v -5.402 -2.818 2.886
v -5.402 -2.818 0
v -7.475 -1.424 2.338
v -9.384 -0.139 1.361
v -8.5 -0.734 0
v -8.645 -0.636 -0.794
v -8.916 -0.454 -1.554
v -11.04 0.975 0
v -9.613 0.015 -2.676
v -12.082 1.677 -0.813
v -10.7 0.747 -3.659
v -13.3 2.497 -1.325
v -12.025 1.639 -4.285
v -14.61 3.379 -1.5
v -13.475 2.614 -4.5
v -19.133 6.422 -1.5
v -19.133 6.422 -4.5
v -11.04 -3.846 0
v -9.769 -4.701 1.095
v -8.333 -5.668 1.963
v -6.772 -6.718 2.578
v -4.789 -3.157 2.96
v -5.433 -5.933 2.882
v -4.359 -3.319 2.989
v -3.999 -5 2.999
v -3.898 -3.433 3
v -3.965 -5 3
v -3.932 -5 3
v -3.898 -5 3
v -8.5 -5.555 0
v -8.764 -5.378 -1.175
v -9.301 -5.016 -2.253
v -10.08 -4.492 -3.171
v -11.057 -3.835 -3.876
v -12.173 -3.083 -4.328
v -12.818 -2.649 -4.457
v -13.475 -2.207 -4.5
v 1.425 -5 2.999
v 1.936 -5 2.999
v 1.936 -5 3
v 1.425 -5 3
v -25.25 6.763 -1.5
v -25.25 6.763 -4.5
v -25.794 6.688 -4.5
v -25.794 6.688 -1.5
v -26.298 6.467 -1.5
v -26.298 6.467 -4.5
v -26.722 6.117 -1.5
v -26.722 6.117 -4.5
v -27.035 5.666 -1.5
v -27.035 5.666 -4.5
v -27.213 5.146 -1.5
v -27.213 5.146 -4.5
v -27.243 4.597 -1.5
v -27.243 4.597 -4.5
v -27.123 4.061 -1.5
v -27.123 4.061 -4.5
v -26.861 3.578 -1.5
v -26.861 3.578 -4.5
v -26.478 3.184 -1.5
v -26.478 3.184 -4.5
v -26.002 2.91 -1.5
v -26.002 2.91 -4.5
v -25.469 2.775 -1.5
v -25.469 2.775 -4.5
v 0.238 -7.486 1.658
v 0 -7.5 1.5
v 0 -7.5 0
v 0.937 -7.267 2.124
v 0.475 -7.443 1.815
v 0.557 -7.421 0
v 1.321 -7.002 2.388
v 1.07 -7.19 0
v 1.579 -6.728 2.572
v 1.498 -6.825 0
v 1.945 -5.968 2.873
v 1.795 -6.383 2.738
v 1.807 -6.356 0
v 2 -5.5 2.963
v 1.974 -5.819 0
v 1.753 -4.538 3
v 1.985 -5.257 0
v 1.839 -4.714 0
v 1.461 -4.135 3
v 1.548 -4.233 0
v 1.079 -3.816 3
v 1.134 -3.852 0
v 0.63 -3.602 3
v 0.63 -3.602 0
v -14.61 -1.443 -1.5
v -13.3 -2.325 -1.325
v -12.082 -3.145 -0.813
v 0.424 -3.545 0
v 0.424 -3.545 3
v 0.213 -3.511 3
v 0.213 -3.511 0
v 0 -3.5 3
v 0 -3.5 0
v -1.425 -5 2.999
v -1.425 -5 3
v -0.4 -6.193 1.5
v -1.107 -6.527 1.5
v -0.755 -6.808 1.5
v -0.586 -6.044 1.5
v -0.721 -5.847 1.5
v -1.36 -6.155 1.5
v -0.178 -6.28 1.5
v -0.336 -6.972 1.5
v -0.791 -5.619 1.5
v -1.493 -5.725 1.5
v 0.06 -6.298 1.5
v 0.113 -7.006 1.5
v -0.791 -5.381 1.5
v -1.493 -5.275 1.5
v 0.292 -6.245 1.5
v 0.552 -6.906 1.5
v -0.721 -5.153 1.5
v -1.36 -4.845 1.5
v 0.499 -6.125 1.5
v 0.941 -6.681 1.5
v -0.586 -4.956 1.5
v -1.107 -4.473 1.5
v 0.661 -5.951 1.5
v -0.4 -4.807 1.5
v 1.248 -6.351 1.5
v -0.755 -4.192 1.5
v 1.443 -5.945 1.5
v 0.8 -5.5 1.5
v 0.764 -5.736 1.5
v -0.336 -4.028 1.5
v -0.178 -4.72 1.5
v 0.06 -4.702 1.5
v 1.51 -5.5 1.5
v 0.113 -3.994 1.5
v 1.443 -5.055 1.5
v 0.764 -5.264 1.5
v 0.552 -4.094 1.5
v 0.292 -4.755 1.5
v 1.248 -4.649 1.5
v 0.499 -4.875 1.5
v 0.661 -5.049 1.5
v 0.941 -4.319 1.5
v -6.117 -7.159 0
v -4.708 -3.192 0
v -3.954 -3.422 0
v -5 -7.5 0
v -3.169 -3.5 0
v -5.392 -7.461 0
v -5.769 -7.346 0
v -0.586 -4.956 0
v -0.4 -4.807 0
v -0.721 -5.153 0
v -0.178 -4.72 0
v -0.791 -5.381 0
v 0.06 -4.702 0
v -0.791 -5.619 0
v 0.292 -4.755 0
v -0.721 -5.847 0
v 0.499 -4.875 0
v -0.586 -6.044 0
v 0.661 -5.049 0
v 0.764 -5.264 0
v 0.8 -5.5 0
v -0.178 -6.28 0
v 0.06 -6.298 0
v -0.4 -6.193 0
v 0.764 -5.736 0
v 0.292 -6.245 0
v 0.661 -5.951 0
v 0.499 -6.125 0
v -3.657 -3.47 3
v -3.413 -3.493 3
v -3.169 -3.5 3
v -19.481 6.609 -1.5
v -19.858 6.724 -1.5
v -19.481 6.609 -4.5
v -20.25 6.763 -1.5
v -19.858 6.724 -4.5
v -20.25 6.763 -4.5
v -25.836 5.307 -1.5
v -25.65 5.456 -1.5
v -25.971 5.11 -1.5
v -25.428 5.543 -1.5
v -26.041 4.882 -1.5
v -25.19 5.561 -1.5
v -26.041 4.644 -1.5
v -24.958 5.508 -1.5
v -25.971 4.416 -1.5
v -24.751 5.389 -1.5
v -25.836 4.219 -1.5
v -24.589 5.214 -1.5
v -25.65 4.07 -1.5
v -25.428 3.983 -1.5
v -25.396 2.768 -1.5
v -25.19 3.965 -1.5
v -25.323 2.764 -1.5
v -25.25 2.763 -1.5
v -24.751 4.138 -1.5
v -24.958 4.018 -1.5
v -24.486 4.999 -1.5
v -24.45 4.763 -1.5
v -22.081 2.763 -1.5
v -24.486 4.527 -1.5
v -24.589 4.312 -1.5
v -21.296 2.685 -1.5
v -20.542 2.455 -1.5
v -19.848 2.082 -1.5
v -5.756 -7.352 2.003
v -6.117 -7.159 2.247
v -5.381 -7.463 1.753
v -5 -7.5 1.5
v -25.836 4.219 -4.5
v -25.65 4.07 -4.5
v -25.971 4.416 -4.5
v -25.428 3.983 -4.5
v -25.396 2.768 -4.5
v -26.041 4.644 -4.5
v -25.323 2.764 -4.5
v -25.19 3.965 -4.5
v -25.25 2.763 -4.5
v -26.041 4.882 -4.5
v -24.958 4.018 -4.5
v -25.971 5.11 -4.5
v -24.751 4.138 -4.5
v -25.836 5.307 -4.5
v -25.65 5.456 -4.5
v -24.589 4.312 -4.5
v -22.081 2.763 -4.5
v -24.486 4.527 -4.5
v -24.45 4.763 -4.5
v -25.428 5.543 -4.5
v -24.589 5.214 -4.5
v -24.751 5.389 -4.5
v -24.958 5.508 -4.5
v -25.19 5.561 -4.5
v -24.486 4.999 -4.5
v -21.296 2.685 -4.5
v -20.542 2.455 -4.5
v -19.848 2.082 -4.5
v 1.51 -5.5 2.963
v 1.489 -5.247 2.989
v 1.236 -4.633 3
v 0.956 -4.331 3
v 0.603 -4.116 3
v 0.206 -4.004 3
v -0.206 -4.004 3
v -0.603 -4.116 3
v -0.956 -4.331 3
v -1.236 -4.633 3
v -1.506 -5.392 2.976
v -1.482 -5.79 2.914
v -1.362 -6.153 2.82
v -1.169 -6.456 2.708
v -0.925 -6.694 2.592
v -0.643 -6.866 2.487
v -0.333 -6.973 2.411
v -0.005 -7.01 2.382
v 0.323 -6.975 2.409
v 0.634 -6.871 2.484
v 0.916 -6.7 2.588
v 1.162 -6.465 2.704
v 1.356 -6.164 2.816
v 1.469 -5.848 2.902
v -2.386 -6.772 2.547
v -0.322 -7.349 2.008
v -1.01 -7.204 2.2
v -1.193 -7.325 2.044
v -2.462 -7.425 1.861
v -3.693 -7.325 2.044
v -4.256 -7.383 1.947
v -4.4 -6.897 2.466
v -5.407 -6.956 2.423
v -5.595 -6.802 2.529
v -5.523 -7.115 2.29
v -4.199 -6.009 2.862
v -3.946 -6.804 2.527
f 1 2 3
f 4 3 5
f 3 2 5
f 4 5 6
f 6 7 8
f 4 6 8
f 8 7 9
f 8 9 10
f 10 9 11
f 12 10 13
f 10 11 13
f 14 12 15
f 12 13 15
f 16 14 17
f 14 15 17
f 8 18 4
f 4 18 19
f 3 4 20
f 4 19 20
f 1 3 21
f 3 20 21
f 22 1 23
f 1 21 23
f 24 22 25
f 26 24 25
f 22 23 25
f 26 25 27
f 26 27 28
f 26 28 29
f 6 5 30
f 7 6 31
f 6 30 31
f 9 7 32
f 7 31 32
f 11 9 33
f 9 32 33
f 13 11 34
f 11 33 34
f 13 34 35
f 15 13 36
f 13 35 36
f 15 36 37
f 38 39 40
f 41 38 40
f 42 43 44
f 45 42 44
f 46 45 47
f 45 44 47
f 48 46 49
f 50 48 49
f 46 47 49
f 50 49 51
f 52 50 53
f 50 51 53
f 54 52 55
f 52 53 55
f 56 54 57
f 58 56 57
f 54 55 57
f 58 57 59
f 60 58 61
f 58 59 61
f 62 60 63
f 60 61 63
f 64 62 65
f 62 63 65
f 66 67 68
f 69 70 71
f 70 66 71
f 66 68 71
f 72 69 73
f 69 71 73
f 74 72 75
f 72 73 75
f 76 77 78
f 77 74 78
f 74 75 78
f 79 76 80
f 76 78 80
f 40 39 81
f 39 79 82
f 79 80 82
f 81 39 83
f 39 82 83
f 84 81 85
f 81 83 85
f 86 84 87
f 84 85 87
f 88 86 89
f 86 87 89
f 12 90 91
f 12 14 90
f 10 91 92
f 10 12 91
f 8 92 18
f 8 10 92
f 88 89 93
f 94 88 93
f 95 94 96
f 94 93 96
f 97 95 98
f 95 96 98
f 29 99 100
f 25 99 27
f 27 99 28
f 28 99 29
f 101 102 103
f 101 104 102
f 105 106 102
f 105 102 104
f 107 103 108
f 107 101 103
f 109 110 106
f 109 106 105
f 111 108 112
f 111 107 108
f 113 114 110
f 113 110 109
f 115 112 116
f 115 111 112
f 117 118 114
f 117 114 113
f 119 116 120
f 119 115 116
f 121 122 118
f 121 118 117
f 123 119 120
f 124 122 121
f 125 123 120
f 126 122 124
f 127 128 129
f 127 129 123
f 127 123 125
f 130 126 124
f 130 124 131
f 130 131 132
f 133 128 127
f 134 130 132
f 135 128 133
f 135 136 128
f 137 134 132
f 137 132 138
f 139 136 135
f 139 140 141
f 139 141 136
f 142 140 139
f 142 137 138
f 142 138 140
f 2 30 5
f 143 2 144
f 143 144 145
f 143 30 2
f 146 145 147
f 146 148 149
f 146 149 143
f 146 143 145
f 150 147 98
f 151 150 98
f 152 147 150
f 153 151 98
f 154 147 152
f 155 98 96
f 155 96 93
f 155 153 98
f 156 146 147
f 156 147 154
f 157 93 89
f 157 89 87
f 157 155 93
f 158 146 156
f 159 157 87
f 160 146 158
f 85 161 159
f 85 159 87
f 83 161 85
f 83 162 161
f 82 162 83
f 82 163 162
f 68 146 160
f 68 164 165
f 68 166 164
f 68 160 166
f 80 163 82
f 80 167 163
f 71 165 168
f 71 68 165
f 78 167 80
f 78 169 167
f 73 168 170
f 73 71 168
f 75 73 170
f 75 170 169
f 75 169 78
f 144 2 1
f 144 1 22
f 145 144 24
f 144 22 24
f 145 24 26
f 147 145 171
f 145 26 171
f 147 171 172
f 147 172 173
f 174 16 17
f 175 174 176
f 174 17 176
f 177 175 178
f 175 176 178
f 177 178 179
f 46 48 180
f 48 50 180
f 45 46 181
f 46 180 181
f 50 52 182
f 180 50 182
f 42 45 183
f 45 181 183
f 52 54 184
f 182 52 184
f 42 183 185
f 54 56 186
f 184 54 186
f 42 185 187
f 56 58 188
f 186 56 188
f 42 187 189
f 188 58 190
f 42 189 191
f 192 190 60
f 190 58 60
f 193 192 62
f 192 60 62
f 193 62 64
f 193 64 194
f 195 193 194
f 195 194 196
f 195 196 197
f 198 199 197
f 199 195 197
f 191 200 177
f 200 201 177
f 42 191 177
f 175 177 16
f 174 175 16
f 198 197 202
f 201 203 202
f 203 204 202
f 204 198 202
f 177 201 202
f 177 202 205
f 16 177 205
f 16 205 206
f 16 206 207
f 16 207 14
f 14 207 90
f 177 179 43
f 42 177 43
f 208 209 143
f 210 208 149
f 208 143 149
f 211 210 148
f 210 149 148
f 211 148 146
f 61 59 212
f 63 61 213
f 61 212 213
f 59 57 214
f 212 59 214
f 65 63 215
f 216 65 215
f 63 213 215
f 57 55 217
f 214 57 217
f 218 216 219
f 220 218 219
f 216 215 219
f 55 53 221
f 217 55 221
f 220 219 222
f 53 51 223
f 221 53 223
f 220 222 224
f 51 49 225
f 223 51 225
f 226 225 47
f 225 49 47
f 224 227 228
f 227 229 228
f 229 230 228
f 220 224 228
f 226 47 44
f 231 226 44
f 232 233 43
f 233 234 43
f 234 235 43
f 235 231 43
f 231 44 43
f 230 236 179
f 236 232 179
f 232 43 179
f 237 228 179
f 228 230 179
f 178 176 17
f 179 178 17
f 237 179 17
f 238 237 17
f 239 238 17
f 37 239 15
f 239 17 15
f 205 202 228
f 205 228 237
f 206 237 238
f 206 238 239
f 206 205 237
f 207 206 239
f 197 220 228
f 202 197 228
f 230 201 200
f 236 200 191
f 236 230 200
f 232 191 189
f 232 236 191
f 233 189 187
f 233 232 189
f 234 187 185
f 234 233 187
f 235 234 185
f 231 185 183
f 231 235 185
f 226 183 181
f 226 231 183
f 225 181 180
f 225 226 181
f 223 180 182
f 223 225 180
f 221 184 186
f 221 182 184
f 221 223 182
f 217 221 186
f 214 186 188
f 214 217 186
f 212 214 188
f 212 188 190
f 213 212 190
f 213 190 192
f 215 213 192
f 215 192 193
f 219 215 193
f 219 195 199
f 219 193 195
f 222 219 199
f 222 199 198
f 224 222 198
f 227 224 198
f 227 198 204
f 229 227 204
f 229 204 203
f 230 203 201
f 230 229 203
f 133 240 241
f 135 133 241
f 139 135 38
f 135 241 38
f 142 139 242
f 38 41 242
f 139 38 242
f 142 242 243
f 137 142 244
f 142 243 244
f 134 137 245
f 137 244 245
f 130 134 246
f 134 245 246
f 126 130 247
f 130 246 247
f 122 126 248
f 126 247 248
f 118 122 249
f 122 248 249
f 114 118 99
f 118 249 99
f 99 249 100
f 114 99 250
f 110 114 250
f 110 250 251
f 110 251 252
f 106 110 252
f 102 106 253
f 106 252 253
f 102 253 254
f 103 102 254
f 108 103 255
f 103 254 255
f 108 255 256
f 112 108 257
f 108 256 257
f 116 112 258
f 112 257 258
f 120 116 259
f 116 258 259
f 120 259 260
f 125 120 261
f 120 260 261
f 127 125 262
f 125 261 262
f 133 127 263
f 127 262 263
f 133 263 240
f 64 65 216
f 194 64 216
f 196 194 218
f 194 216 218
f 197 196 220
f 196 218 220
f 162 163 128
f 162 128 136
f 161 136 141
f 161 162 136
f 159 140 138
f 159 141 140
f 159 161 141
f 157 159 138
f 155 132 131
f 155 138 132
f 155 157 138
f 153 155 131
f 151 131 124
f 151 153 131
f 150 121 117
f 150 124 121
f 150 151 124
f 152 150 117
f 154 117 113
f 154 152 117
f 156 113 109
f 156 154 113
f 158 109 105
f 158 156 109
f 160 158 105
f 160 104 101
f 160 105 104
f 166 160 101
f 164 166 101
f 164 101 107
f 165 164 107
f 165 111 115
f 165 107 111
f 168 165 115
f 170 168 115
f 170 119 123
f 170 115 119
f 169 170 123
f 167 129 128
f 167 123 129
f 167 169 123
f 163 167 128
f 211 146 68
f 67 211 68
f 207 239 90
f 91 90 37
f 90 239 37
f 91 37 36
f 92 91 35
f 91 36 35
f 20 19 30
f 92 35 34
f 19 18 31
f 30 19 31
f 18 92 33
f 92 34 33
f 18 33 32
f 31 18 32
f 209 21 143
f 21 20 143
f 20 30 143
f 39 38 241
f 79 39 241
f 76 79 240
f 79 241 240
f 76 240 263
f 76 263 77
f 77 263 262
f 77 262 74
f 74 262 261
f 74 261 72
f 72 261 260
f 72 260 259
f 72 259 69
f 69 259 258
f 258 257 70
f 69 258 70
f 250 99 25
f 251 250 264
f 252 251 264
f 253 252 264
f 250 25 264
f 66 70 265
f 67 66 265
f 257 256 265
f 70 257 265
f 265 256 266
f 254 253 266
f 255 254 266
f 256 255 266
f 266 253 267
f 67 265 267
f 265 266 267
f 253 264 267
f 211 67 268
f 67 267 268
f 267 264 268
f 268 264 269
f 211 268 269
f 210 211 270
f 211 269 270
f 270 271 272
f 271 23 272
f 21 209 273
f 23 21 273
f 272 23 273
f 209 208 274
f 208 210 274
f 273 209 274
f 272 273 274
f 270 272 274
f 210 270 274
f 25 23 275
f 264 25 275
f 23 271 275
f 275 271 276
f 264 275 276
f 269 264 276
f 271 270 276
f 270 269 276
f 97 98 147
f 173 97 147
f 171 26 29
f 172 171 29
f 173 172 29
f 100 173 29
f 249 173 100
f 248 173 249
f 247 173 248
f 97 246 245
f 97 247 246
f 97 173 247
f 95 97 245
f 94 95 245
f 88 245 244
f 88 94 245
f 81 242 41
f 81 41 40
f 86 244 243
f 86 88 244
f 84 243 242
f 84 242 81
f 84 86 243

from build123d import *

# Parameters (mm, degrees)
BOSS_EXTRUDE1_DEPTH      = 3
BOSS_EXTRUDE1_DEPTH_BACK = 4.5
SKETCH1_R                = 0.8
FILLET1_R                = 4
CUT_EXTRUDE2_DEPTH       = 29.619267985
CUT_EXTRUDE2_DEPTH_BACK  = 29.619267985
SKETCH4_W                = 10.5
SKETCH4_H                = 4.5
CUT_EXTRUDE3_DEPTH       = 29.619267985
CUT_EXTRUDE3_DEPTH_BACK  = 29.619267985
SKETCH5_W                = 15
SKETCH5_H                = 4.5
FILLET2_R                = 10
FILLET3_R                = 5
FILLET4_R                = 5
CUT_EXTRUDE4_START       = -6.772335917
CUT_EXTRUDE4_DEPTH       = 8.772335917
SKETCH7_R                = 1.51
CUT_EXTRUDE5_DEPTH       = 1.5


# Read off the part's stored shape, not the designer's step: Cut-Extrude4
with BuildPart() as part:
    # Sketch1 → Boss-Extrude1 (new, two sides: drawn at the far end of the back side and taken through both)
    with BuildSketch(Plane.XY.offset(-BOSS_EXTRUDE1_DEPTH_BACK)):
        with BuildLine():
            Line((-4.389678411, -3.5), (-19.133343362, 6.422379894))
            ThreePointArc((-19.133343362, 6.422379894), (-19.666253628, 6.676053774), (-20.25, 6.763139721))
            Line((-20.25, 6.763139721), (-25.25, 6.763139721))
            ThreePointArc((-25.25, 6.763139721), (-27.246991207, 4.872803379), (-25.468997361, 2.775165839))
            ThreePointArc((-25.468997361, 2.775165839), (-25.359663658, 2.766148514), (-25.25, 2.763139721))
            Line((-25.25, 2.763139721), (-20.860321589, 2.763139721))
            Line((-20.860321589, 2.763139721), (-6.116656638, -7.159240173))
            ThreePointArc((-6.116656638, -7.159240173), (-5.583746372, -7.412914053), (-5, -7.5))
            Line((-5, -7.5), (0, -7.5))
            ThreePointArc((0, -7.5), (1.974370247, -5.81915847), (0.630136986, -3.601862129))
            ThreePointArc((0.630136986, -3.601862129), (0.31915847, -3.525629753), (0, -3.5))
            Line((0, -3.5), (-4.389678411, -3.5))
        make_face()
        with Locations((0, -5.5)):
            Circle(SKETCH1_R, mode=Mode.SUBTRACT)
        with Locations((-25.25, 4.763139721)):
            Circle(SKETCH1_R, mode=Mode.SUBTRACT)
    extrude(amount=BOSS_EXTRUDE1_DEPTH + BOSS_EXTRUDE1_DEPTH_BACK)

    # Fillet1
    fillet1_edges = [part.edges().sort_by_distance(p)[0] for p in [
        (-4.389678411, -3.5, -0.75),
        (-20.860321589, 2.763139721, -0.75),
    ]]
    fillet(fillet1_edges, radius=FILLET1_R)

    # Sketch4 → Cut-Extrude2 (cut, two sides: drawn at the far end of the back side and taken through both)
    with BuildSketch(Plane(origin=(0, 0, 0), x_dir=(1, 0, 0), z_dir=(0, 1, 0)).offset(-CUT_EXTRUDE2_DEPTH_BACK)):
        with Locations((-3.25, 2.25)):
            Rectangle(SKETCH4_W, SKETCH4_H)
    extrude(amount=CUT_EXTRUDE2_DEPTH + CUT_EXTRUDE2_DEPTH_BACK, mode=Mode.SUBTRACT)

    # Sketch5 → Cut-Extrude3 (cut, two sides: drawn at the far end of the back side and taken through both)
    with BuildSketch(Plane(origin=(0, 0, 0), x_dir=(1, 0, 0), z_dir=(0, 1, 0)).offset(-CUT_EXTRUDE3_DEPTH_BACK)):
        with Locations((-19.75, -0.75)):
            Rectangle(SKETCH5_W, SKETCH5_H)
    extrude(amount=CUT_EXTRUDE3_DEPTH + CUT_EXTRUDE3_DEPTH_BACK, mode=Mode.SUBTRACT)

    # Fillet2
    # the kernel refuses this fillet: 10 mm, written as the material it takes off along each edge
    with BuildSketch(Plane(origin=(-12.25, -23.910660804, 3), x_dir=(1.537930276954748e-12, 0, -1.0), z_dir=(0, 1, 0))) as fillet2_piece_1:
        with BuildLine():
            CenterArc((10, -8.351646544), FILLET2_R, 123.367012969, 56.632987031)
            Line((0, -8.351646544), (-0.2, -8.351646544))
            Line((-0.2, -8.351646544), (-0.2, 0))
            Line((-0.2, 0), (0, 0.2))
            ThreePointArc((0, 0.2), (2.25, 0.2), (4.39, 0.167032931))
            Line((4.39, 0.167032931), (4.5, 0))
        make_face()
    extrude(amount=46.579716753, mode=Mode.SUBTRACT)

    # Fillet3
    # the kernel refuses this fillet: 5 mm, written as the material it takes off along each edge
    with BuildSketch(Plane(origin=(-8.5, -17.99261029, -4.5), x_dir=(0, 0, 1), z_dir=(0, 1, 0))) as fillet3_piece_1:
        with BuildLine():
            CenterArc((5, -4.974937186), FILLET3_R, 95.739170477, 84.260829523)
            Line((0, -4.974937186), (-0.1, -4.974937186))
            Line((-0.1, -4.974937186), (-0.1, 0))
            Line((-0.1, 0), (0, 0.1))
            ThreePointArc((0, 0.1), (2.25, 0.1), (4.49, 0.099498744))
            Line((4.49, 0.099498744), (4.5, 0))
        make_face()
    extrude(amount=29.696169959, mode=Mode.SUBTRACT)

    # Fillet4
    fillet4_edges = [part.edges().sort_by_distance(p)[0] for p in [
        (-12.25, -0.620802428, -1.5),
    ]]
    fillet(fillet4_edges, radius=FILLET4_R)

    # Cut-Extrude4 outline → Cut-Extrude4 (cut)
    with BuildSketch(Plane(origin=(0, 0, 0), x_dir=(0, 0, -1), z_dir=(1, 0, 0)).offset(CUT_EXTRUDE4_START)):
        with BuildLine():
            add(Edge.make_bspline(
                [(-2.999498449, -5), (-2.961702123, -7.5), (-1.5, -7.5)],
                knots=[4.738249611, 4.738249611, 4.738249611, 6.283185307, 6.283185307, 6.283185307], degree=2, weights=[1, 0.716190529, 1]))
            Line((-2.999498449, -5), (-3, -5))
            Line((-3, -5), (-3, -7.5))
            Line((-3, -7.5), (-1.5, -7.5))
        make_face()
    extrude(amount=CUT_EXTRUDE4_DEPTH, mode=Mode.SUBTRACT)

    # Sketch7 → Cut-Extrude5 (cut)
    with BuildSketch(Plane.XY.offset(3)):
        with Locations((0, -5.5)):
            Circle(SKETCH7_R)
    extrude(amount=-CUT_EXTRUDE5_DEPTH, mode=Mode.SUBTRACT)


solid = part.part
